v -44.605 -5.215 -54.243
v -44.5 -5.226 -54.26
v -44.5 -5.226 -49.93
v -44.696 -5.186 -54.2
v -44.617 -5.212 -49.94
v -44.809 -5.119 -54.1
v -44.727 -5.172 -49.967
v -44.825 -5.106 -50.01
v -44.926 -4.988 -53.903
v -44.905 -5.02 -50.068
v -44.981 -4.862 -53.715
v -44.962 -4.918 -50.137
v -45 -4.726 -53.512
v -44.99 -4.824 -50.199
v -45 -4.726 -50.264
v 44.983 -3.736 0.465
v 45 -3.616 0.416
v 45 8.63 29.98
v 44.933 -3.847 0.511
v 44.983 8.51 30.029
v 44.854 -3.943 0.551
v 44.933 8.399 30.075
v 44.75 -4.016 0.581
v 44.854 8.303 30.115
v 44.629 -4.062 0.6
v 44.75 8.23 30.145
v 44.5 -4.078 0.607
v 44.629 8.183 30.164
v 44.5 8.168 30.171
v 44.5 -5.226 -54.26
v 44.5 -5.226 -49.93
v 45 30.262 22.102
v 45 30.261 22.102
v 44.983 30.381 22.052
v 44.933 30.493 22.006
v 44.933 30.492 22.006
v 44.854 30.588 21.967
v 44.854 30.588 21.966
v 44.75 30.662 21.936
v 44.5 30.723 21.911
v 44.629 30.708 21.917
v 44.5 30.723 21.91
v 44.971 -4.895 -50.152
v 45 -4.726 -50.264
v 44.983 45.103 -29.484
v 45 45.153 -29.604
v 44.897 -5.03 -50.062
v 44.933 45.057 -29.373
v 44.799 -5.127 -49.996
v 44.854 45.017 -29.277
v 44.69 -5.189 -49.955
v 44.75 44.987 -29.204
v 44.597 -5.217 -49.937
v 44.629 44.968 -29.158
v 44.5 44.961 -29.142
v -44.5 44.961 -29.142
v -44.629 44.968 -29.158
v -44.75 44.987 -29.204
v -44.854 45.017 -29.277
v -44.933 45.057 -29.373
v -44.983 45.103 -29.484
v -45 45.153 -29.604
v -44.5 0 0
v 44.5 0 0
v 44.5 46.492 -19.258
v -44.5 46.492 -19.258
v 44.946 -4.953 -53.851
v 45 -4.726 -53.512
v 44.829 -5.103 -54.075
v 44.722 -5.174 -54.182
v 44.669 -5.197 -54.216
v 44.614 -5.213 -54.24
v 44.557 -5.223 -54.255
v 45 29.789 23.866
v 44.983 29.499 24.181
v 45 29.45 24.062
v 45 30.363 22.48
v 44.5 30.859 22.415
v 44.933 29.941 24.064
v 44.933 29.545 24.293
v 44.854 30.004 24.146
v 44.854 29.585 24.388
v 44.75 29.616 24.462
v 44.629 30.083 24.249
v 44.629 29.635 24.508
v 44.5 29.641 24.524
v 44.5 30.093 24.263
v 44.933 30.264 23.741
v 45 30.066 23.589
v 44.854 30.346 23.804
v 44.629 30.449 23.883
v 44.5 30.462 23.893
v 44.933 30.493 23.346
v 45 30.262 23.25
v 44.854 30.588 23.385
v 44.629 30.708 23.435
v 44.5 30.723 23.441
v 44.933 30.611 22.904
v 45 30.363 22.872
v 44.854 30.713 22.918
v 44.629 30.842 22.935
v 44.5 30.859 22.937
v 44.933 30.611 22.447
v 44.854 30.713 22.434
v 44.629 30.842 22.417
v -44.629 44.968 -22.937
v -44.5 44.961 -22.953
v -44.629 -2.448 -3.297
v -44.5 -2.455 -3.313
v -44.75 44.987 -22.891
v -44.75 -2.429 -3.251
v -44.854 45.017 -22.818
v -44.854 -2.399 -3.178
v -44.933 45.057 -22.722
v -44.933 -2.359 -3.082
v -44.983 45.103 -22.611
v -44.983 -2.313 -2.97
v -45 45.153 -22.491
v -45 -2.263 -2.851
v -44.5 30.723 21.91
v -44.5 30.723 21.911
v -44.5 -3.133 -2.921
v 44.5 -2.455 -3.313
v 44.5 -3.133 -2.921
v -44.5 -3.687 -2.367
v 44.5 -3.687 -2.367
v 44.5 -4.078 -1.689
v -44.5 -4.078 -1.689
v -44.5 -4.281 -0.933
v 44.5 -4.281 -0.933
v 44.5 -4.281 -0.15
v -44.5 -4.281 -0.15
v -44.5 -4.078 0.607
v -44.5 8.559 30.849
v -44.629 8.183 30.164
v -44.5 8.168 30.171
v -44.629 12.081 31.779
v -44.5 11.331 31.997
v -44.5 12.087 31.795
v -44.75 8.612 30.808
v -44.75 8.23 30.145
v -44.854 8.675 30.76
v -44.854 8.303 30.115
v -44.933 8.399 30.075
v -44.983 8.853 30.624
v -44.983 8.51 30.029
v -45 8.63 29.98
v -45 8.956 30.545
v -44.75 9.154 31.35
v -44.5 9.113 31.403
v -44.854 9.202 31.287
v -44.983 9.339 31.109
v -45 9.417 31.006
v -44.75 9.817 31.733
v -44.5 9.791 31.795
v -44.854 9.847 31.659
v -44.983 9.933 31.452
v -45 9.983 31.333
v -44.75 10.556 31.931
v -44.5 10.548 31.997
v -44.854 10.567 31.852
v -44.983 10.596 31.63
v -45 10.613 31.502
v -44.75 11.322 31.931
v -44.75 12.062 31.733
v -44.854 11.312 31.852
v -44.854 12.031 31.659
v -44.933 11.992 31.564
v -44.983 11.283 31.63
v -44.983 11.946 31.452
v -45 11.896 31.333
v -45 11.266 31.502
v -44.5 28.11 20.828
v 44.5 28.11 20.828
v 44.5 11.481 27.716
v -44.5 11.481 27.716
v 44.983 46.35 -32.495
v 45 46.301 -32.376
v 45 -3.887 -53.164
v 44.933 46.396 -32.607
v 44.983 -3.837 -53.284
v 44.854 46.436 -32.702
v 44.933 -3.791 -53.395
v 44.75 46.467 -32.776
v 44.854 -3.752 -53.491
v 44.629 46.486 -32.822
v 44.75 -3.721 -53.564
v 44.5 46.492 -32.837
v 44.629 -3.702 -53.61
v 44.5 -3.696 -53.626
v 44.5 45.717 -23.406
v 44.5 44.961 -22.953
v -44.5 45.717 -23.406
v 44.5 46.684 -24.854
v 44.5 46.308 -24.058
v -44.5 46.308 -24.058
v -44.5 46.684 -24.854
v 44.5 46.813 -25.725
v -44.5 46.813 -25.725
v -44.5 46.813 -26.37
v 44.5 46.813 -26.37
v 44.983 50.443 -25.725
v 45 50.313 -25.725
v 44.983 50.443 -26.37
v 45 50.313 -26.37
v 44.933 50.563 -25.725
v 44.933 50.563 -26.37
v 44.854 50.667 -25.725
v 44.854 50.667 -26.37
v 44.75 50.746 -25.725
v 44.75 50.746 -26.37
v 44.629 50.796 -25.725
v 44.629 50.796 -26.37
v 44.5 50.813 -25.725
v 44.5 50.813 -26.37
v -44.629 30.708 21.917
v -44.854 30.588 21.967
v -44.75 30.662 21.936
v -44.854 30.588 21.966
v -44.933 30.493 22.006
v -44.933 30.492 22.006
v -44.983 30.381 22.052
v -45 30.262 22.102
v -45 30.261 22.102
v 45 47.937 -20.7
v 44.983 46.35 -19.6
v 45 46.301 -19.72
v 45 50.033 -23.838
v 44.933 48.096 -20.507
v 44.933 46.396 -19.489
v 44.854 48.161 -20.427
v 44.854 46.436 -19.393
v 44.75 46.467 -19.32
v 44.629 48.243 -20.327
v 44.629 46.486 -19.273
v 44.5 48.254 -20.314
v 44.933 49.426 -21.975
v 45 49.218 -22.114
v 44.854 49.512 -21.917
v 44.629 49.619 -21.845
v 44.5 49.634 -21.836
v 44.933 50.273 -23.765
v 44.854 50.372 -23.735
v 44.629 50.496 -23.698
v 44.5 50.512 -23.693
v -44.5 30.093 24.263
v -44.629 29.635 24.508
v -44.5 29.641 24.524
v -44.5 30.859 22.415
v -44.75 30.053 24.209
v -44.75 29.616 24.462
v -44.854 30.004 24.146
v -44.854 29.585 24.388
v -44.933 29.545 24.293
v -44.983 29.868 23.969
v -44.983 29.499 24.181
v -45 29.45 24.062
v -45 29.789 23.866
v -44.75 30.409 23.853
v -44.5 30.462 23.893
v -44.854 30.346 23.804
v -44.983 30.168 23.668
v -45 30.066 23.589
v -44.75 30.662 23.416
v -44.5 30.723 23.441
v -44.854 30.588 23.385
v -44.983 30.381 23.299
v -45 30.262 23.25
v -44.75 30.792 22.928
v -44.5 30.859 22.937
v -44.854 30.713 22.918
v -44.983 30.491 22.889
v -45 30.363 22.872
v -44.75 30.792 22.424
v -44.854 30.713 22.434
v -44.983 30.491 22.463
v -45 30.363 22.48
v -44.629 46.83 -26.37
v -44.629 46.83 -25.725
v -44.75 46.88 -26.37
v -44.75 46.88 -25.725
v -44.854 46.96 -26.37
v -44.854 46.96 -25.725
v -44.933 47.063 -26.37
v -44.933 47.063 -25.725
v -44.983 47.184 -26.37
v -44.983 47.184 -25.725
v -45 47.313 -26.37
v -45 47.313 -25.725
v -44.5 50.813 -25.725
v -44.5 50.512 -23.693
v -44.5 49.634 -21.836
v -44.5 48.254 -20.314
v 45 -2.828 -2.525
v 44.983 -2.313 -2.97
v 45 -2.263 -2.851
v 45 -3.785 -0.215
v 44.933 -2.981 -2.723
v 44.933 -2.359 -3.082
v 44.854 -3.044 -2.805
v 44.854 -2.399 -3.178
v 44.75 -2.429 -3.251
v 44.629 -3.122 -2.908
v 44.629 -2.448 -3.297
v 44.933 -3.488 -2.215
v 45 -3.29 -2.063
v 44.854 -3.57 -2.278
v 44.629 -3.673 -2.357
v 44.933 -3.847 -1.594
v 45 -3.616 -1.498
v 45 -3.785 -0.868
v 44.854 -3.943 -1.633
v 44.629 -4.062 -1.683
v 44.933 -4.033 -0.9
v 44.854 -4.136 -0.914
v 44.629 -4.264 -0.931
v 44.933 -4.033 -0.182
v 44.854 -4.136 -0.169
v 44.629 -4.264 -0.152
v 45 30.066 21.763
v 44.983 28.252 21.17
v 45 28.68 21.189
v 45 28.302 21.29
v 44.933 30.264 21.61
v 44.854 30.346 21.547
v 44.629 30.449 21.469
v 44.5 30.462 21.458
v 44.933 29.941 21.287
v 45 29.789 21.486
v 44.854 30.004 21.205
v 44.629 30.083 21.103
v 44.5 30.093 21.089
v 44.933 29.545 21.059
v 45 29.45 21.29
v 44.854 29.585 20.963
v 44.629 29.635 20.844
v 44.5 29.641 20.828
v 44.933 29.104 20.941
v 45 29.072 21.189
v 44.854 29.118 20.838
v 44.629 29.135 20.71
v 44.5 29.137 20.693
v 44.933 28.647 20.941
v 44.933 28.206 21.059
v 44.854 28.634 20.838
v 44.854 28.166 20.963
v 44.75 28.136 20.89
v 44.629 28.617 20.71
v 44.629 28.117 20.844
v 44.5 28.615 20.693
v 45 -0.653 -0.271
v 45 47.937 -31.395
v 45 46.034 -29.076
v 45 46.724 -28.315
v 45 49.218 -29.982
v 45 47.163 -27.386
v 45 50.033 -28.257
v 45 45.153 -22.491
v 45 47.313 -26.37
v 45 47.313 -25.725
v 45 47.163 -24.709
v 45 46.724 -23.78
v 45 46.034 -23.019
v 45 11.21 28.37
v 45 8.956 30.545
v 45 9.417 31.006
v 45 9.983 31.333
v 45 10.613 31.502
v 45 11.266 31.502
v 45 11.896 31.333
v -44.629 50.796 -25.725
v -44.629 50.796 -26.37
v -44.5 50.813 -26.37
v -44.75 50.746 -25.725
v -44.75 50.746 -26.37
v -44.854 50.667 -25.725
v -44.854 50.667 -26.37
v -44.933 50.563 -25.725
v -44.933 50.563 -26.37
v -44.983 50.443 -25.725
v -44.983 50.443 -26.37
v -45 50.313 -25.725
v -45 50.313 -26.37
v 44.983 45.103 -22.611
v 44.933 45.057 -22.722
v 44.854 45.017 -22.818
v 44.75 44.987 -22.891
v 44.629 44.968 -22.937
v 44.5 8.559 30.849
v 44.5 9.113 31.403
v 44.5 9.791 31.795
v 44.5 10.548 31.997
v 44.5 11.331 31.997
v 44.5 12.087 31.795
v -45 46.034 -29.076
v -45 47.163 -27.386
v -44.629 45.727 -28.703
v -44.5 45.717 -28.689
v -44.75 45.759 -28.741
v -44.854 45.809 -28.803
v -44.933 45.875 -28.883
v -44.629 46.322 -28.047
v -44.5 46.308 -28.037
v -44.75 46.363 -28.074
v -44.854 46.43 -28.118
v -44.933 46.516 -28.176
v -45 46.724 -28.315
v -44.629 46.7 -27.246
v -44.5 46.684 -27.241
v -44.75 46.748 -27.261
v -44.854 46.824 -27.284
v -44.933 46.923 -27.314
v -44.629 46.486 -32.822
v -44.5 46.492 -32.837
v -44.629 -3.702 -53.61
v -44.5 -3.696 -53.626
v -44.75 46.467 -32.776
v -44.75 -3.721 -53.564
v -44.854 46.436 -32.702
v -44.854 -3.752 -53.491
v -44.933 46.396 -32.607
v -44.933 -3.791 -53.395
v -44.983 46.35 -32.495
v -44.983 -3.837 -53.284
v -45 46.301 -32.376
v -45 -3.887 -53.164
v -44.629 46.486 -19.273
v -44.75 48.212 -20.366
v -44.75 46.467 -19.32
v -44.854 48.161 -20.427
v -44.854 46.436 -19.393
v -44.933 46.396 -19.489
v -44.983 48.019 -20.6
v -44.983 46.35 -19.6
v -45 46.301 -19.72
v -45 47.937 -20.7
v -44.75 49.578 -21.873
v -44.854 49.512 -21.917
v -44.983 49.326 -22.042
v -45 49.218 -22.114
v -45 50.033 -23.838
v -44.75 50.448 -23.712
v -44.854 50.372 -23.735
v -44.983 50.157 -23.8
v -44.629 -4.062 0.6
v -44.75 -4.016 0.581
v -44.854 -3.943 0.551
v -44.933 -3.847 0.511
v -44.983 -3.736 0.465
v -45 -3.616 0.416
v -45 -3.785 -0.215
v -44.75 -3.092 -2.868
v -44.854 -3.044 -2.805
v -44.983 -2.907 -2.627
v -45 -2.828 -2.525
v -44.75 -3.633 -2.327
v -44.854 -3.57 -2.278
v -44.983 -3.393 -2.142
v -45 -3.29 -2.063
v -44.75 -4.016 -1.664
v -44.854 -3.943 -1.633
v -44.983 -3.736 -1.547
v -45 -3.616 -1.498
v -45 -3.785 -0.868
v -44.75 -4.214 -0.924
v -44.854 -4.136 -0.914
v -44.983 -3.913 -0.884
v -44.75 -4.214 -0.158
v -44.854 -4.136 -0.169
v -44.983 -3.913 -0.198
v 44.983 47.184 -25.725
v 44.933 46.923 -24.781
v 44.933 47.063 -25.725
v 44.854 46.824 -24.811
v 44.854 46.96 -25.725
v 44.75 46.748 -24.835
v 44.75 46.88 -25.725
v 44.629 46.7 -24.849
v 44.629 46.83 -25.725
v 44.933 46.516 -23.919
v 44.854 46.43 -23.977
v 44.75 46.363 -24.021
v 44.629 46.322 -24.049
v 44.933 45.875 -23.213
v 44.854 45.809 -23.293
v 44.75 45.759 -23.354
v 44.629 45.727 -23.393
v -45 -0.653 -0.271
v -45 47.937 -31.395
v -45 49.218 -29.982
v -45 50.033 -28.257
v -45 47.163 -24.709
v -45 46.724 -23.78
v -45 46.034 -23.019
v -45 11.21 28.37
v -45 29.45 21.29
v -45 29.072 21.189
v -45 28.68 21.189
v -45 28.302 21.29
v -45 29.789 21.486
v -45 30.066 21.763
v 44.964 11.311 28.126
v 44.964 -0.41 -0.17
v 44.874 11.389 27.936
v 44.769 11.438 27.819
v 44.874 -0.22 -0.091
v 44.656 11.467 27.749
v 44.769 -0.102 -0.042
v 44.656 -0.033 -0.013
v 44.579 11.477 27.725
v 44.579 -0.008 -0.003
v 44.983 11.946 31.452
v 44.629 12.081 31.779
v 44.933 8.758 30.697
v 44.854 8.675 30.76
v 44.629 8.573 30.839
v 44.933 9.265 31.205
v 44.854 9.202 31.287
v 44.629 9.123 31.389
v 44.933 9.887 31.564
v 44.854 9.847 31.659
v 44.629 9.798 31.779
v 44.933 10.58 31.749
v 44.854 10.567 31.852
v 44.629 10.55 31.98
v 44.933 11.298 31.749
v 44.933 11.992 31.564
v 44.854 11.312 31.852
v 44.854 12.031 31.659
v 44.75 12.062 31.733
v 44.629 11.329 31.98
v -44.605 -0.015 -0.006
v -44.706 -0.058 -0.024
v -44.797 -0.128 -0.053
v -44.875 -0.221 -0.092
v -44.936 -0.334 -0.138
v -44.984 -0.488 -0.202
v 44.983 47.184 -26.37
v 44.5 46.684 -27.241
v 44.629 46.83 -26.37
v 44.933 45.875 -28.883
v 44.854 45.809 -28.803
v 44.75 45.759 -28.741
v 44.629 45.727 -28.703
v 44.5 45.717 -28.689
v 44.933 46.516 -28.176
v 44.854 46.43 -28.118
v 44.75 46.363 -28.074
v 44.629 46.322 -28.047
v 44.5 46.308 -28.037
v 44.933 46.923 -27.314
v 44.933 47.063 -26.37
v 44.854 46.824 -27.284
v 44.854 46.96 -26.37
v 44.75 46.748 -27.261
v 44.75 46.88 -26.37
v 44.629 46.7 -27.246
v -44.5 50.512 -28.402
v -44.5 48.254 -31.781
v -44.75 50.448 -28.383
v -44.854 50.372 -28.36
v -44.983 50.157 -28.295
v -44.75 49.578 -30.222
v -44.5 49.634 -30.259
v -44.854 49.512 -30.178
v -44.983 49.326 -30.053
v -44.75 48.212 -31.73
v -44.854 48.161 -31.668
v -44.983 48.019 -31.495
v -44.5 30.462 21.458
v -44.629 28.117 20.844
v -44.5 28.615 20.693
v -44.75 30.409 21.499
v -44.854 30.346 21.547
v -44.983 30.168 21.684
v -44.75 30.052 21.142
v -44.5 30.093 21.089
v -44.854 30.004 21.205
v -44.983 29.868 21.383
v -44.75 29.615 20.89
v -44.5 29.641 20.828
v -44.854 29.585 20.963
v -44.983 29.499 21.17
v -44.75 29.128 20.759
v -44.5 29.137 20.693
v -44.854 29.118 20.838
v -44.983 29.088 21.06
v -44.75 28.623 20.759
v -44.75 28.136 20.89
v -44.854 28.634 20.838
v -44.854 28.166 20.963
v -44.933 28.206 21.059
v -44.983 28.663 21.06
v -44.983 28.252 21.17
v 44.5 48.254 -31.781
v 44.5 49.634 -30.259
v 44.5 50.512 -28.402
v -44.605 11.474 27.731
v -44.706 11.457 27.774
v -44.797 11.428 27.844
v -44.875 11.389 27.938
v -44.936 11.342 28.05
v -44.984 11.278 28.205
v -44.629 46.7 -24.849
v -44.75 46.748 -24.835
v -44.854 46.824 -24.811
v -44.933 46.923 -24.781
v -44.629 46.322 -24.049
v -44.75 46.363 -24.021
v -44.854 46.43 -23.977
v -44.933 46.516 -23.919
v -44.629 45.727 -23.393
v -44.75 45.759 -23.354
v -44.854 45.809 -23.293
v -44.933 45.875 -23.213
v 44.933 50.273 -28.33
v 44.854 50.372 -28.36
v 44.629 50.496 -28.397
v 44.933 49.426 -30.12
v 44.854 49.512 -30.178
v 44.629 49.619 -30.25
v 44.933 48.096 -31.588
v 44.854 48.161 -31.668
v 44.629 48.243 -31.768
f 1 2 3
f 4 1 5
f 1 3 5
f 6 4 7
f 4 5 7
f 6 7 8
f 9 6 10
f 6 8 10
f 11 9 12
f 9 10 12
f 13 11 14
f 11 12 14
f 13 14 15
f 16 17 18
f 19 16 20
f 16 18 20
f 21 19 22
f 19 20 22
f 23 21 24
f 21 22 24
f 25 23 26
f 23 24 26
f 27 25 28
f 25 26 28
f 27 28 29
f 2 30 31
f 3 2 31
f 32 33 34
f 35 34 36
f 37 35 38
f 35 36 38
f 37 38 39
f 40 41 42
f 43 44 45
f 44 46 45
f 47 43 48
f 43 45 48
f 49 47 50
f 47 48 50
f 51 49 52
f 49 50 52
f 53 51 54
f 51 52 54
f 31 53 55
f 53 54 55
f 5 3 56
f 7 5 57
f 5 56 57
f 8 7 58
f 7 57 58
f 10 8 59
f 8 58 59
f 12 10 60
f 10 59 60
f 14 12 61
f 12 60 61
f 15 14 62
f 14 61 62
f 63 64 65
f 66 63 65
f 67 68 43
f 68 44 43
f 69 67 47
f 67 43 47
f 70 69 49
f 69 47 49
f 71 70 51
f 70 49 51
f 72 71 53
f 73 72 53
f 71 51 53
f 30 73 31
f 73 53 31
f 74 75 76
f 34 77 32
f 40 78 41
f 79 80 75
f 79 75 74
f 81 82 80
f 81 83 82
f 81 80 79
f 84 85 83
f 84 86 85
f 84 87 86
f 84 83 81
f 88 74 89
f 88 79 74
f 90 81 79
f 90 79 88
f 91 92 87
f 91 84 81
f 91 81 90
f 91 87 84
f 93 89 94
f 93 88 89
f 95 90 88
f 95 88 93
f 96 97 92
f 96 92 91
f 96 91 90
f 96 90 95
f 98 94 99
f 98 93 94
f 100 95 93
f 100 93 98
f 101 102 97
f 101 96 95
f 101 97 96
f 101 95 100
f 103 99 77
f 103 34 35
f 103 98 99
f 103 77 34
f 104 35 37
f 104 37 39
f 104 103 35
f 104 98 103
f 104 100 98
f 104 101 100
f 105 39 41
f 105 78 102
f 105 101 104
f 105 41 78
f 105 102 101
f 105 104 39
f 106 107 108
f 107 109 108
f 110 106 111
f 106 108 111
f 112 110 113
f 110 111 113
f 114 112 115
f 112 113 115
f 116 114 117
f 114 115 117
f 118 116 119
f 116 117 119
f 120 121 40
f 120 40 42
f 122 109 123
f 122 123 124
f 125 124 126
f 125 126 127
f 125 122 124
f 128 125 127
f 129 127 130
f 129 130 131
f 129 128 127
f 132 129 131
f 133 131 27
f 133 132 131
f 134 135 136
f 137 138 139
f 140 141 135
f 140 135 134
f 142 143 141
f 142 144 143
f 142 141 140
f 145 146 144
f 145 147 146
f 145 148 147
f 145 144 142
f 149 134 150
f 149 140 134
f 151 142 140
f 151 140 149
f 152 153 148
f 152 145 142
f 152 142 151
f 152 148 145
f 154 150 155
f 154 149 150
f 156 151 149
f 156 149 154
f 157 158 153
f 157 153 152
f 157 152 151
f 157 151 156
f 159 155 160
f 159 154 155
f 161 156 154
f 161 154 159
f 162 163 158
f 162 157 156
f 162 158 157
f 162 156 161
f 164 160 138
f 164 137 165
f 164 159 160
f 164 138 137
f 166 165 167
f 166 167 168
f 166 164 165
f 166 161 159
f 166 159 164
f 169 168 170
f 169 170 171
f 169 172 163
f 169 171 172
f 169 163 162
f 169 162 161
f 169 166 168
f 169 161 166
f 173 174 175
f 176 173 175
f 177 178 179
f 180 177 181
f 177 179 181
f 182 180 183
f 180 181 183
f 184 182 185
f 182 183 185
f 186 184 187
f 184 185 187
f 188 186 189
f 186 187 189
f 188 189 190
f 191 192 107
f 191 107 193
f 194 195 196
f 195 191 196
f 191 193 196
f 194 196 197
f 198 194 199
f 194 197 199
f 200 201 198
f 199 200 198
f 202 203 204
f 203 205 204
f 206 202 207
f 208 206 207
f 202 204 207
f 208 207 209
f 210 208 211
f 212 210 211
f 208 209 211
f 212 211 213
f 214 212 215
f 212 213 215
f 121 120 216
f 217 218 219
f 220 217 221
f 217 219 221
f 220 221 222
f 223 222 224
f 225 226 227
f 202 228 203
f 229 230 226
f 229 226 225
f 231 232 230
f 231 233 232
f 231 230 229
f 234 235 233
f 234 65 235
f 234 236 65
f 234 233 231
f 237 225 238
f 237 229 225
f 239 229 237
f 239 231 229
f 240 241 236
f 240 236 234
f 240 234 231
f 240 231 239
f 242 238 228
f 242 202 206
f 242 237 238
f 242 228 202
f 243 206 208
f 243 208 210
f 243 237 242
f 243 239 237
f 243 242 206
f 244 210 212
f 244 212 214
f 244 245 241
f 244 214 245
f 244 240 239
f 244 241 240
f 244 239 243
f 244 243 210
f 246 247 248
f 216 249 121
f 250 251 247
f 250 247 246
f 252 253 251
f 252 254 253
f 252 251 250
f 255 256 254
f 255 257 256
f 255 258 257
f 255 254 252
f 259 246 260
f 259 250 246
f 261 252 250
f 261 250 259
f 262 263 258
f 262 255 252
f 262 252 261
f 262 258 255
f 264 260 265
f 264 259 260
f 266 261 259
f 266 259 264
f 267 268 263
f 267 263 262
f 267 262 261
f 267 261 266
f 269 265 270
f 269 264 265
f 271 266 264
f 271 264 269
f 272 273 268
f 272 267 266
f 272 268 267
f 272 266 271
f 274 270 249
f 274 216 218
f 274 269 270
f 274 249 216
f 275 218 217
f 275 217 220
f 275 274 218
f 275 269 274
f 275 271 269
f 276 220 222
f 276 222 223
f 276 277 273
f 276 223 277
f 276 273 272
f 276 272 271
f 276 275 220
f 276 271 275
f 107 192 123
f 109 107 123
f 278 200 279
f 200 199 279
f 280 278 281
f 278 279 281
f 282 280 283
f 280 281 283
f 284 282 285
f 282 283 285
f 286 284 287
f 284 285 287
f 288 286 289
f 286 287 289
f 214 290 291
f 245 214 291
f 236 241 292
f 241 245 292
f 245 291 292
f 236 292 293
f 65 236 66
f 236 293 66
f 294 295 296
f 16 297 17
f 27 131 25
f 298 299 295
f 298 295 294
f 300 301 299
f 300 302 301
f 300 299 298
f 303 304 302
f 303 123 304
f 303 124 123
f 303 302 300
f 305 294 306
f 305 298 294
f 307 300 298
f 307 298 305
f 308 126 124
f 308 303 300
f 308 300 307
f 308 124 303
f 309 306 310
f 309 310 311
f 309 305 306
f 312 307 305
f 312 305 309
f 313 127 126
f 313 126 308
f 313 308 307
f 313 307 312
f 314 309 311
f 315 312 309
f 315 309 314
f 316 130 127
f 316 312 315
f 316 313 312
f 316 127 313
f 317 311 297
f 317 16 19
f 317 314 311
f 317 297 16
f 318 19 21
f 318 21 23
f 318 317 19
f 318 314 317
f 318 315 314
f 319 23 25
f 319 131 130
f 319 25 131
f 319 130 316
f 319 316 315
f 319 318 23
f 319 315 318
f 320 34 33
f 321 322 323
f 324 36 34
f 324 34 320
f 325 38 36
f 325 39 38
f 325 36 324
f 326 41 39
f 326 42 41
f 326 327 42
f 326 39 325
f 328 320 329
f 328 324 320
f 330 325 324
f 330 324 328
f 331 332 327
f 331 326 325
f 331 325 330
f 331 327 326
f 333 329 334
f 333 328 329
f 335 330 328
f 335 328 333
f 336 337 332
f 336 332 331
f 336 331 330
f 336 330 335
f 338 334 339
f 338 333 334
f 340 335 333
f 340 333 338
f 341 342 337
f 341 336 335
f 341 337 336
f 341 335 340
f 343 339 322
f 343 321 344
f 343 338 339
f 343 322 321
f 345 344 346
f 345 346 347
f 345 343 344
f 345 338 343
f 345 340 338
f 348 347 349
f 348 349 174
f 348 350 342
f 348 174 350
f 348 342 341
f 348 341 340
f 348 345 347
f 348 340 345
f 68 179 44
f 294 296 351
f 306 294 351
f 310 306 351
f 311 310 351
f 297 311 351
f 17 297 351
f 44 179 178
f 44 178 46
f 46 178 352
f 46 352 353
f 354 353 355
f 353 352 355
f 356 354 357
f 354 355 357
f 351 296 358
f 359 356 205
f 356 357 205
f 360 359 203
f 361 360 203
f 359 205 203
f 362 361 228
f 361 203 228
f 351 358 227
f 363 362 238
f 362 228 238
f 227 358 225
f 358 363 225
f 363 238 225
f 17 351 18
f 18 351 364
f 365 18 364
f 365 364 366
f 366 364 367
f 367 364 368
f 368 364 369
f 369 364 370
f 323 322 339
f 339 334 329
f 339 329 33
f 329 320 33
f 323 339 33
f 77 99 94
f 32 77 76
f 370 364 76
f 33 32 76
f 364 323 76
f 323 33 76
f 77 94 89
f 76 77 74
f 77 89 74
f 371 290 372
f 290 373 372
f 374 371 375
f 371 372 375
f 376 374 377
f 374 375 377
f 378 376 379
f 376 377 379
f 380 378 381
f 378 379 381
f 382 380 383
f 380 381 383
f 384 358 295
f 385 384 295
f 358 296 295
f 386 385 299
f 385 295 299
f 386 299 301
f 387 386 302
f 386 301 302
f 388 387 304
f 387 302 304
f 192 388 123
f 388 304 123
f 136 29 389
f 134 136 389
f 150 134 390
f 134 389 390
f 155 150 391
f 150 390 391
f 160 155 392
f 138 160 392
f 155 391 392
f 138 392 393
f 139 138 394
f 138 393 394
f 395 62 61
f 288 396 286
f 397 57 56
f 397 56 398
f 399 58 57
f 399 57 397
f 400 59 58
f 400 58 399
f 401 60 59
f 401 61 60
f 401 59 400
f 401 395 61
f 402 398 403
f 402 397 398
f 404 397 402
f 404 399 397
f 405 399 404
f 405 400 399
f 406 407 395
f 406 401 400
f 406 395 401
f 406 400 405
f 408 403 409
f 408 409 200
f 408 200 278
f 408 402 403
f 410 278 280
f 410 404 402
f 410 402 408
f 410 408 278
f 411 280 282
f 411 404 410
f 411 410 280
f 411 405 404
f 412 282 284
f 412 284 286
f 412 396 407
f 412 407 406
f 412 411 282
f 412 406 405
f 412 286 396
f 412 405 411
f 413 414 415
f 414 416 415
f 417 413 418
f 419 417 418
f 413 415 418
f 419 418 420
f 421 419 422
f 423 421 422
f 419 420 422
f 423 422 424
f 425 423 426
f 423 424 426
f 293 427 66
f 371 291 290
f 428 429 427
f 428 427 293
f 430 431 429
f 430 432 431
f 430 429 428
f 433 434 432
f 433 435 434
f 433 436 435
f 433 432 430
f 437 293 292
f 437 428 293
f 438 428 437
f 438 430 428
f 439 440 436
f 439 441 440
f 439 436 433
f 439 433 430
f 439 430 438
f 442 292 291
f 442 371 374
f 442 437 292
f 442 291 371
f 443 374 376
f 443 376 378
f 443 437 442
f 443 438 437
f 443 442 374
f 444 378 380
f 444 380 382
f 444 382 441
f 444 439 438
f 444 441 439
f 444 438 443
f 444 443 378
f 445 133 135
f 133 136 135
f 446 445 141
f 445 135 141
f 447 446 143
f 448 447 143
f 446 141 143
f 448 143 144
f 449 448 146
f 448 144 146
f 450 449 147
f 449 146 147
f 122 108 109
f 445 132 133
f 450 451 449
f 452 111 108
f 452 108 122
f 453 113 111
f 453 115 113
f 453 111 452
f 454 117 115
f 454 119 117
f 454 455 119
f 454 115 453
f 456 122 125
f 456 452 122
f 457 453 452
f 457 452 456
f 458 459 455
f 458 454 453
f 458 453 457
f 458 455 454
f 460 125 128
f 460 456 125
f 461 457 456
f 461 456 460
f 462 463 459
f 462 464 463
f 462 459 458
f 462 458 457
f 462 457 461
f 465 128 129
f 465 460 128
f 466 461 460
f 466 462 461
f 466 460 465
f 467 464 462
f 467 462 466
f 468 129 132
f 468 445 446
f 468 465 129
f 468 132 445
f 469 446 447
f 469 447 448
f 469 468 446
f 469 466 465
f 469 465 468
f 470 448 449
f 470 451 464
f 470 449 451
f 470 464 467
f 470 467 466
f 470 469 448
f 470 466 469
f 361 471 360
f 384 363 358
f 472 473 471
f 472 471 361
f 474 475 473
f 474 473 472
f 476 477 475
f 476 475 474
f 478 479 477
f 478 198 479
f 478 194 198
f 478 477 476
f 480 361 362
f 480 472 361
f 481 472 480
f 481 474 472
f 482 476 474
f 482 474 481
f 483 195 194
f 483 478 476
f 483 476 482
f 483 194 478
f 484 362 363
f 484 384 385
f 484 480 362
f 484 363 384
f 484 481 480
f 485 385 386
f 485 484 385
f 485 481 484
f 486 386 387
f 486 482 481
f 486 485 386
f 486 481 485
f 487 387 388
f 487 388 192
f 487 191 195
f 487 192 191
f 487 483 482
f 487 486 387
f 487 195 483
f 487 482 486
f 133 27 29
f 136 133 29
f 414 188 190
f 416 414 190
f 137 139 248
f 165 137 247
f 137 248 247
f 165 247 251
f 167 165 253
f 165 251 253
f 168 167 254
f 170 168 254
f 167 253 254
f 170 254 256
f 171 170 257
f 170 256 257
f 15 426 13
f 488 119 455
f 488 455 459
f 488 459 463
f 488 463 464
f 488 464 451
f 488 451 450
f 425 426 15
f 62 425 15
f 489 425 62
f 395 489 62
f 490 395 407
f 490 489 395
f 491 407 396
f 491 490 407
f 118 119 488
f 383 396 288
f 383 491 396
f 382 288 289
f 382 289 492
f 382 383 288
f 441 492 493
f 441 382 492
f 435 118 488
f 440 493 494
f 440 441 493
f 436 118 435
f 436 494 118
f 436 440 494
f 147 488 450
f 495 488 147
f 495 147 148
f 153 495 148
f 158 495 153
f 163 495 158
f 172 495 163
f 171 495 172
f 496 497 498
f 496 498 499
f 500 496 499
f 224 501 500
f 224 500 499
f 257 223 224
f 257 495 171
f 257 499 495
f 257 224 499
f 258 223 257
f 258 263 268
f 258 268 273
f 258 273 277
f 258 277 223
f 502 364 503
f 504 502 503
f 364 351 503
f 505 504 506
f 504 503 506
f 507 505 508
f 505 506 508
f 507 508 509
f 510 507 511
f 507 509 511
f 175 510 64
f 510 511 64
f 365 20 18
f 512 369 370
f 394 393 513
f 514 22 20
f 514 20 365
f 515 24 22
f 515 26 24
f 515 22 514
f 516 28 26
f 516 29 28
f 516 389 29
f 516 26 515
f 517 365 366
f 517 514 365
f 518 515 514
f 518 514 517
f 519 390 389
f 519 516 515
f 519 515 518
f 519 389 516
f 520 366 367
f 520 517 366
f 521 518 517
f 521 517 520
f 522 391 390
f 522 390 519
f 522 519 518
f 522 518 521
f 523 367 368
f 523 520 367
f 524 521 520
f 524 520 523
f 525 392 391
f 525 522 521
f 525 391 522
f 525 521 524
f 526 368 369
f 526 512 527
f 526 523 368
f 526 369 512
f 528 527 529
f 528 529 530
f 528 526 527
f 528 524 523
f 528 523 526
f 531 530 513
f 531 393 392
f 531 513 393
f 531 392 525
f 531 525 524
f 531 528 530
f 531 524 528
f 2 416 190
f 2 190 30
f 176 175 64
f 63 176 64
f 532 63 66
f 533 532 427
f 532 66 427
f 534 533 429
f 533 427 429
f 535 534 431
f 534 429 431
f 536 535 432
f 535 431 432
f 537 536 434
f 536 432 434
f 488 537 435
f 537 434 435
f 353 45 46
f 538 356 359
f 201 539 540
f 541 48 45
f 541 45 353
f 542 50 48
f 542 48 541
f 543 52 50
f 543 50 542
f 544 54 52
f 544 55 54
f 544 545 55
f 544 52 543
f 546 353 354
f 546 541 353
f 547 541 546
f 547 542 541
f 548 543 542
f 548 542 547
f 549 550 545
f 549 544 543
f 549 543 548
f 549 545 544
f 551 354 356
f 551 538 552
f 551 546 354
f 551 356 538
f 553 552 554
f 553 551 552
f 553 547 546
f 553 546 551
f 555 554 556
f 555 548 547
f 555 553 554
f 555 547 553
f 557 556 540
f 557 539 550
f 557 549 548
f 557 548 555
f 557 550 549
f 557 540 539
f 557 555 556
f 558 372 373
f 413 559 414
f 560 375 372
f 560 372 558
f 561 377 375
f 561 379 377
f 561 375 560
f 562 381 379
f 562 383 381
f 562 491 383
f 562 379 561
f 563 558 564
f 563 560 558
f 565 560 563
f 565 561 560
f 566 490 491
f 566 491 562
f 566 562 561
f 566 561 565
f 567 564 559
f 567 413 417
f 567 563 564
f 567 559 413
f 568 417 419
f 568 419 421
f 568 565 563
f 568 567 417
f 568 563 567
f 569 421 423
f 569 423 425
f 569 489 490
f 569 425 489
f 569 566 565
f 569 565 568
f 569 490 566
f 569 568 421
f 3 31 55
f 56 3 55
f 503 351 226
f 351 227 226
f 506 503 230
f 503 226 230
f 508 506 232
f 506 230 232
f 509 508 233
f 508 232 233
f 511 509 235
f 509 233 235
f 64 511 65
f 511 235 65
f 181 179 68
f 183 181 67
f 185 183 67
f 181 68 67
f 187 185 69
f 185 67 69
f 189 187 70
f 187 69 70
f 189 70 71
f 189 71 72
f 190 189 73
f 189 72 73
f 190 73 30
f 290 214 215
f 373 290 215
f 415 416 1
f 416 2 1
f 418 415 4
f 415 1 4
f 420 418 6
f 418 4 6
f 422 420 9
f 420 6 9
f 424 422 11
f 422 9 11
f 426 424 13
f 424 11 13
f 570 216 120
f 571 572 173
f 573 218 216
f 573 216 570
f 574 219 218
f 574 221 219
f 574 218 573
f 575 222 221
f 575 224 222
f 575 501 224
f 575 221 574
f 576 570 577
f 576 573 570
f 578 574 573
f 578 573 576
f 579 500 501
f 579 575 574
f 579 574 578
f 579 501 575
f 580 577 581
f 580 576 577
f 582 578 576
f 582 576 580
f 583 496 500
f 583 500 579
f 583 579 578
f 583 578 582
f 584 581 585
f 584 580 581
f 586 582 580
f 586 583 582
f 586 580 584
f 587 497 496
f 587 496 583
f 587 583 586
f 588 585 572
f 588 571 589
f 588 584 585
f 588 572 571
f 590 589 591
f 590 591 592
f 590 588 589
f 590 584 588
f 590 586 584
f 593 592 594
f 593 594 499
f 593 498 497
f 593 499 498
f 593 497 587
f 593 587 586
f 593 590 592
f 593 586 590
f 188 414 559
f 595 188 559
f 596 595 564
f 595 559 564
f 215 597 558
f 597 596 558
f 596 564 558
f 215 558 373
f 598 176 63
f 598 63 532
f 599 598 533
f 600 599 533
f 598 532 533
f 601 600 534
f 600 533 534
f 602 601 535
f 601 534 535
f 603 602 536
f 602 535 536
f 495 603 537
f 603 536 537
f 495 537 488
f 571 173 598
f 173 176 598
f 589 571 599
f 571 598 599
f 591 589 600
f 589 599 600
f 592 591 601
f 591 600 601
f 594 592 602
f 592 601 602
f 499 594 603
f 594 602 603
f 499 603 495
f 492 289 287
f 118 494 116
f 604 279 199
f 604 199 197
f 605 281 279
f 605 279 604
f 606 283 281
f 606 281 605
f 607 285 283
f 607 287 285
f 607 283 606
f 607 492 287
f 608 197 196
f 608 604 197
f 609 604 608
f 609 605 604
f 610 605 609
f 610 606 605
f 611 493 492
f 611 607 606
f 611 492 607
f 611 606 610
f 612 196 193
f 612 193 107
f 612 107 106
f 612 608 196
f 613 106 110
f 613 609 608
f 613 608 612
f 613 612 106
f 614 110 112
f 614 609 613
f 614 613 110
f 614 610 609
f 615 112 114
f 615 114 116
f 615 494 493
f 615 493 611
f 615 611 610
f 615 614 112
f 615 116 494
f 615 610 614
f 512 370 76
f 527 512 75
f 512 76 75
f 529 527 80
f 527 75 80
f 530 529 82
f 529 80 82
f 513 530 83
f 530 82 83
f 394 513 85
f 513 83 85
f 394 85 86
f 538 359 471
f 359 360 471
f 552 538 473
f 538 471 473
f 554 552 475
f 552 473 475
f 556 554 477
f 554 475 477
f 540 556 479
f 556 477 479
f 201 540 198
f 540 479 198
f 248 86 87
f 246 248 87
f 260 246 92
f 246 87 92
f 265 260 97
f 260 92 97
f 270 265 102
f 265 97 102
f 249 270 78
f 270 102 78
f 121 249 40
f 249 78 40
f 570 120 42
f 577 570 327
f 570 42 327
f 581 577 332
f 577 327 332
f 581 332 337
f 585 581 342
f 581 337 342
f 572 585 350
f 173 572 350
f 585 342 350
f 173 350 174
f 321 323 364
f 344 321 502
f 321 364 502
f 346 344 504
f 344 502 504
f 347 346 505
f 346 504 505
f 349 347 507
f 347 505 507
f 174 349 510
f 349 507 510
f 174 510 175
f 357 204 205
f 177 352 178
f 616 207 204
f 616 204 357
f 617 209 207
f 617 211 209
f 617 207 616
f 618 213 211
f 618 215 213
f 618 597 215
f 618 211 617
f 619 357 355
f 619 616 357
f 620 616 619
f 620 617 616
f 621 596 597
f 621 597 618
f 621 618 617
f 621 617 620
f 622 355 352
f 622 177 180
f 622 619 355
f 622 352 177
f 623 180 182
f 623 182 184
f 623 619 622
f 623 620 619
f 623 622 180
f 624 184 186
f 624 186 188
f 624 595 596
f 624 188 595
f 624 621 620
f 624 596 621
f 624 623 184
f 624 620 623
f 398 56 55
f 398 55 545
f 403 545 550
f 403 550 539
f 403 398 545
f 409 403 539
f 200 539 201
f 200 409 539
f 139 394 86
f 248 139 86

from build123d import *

# Parameters (mm, degrees)
BOSS_EXTRUDE1_DEPTH = 45
FILLET1_R           = 7
FILLET3_R           = 3
FILLET4_R           = 3
FILLET5_R           = 2
FILLET6_R           = 0.5


with BuildPart() as part:
    # Sketch1 → Boss-Extrude1 (new, symmetric)
    with BuildSketch(Plane(origin=(0, 0, 0), x_dir=(0, 0, -1), z_dir=(1, 0, 0))):
        Polygon((-20.062717328, 29.958093621), (-27.716385975, 11.480502971), (0, 0), (21.04758878, 50.813374288), (31.04758878, 50.813374288), (53.62591129, -3.69551813), (54.259961961, -5.22625186), (49.93039316, -5.22625186), (28.374874228, 46.813374288), (23.720303332, 46.813374288), (2.164784401, -5.22625186), (-32.942637835, 9.31571857), (-23.758235458, 31.488827351), align=None)
    extrude(amount=BOSS_EXTRUDE1_DEPTH, both=True)

    # Fillet1
    fillet1_edges = [part.edges().sort_by_distance(p)[0] for p in [
        (0, 50.813374288, -21.04758878),
        (0, 50.813374288, -31.04758878),
    ]]
    fillet(fillet1_edges, radius=FILLET1_R)

    # Fillet3
    fillet3_edges = [part.edges().sort_by_distance(p)[0] for p in [
        (0, 46.813374288, -28.374874228),
        (0, 46.813374288, -23.720303332),
    ]]
    fillet(fillet3_edges, radius=FILLET3_R)

    # Fillet4
    fillet4_edges = [part.edges().sort_by_distance(p)[0] for p in [
        (0, -5.22625186, -2.164784401),
        (0, 9.31571857, 32.942637835),
    ]]
    fillet(fillet4_edges, radius=FILLET4_R)

    # Fillet5
    fillet5_edges = [part.edges().sort_by_distance(p)[0] for p in [
        (0, 29.958093621, 20.062717328),
        (0, 31.488827351, 23.758235458),
    ]]
    fillet(fillet5_edges, radius=FILLET5_R - 0.0001)  # a hair under: the kernel refuses the full size

    # Fillet6
    fillet6_edges = [part.edges().sort_by_distance(p)[0] for p in [
        (-45, 19.795464958, 24.27221595),
        (-45, 5.740251485, 13.858192988),
        (-45, 20.632953228, -43.548728501),
        (-45, -5.22625186, -52.09517756),
        (45, -5.22625186, -52.09517756),
        (45, 20.632953228, -43.548728501),
        (-45, 23.246079157, -9.628841259),
        (45, 23.246079157, -9.628841259),
        (-45, 50.813374288, -26.04758878),
        (-45, 49.633661574, -30.259329946),
        (-45, 49.633661574, -21.835847614),
        (45, 50.813374288, -26.04758878),
        (45, 49.633661574, -30.259329946),
        (45, 49.633661574, -21.835847614),
        (45, 5.740251485, 13.858192988),
        (-45, 19.867586363, -39.536185036),
        (45, 19.867586363, -39.536185036),
        (-45, 46.813374288, -26.04758878),
        (45, 46.813374288, -26.04758878),
        (45, 19.795464958, 24.27221595),
        (-45, 46.307783125, -28.037049014),
        (45, 46.307783125, -28.037049014),
        (-45, 46.307783125, -24.058128546),
        (45, 46.307783125, -24.058128546),
        (-45, 2.044733355, 15.388926717),
        (45, 2.044733355, 15.388926717),
        (-45, 21.253405662, -13.133017673),
        (-45, -4.078201562, -1.689246397),
        (-45, 9.791256574, 31.794587538),
        (45, 21.253405662, -13.133017673),
        (45, -4.078201562, -1.689246397),
        (45, 9.791256574, 31.794587538),
        (-45, 20.864258921, 28.159075796),
        (-45, 30.723498754, 23.441225974),
        (-45, 29.641084137, 20.828045924),
        (45, 20.864258921, 28.159075796),
        (45, 30.723498754, 23.441225974),
        (45, 29.641084137, 20.828045924),
    ]]
    fillet(fillet6_edges, radius=FILLET6_R)


solid = part.part
